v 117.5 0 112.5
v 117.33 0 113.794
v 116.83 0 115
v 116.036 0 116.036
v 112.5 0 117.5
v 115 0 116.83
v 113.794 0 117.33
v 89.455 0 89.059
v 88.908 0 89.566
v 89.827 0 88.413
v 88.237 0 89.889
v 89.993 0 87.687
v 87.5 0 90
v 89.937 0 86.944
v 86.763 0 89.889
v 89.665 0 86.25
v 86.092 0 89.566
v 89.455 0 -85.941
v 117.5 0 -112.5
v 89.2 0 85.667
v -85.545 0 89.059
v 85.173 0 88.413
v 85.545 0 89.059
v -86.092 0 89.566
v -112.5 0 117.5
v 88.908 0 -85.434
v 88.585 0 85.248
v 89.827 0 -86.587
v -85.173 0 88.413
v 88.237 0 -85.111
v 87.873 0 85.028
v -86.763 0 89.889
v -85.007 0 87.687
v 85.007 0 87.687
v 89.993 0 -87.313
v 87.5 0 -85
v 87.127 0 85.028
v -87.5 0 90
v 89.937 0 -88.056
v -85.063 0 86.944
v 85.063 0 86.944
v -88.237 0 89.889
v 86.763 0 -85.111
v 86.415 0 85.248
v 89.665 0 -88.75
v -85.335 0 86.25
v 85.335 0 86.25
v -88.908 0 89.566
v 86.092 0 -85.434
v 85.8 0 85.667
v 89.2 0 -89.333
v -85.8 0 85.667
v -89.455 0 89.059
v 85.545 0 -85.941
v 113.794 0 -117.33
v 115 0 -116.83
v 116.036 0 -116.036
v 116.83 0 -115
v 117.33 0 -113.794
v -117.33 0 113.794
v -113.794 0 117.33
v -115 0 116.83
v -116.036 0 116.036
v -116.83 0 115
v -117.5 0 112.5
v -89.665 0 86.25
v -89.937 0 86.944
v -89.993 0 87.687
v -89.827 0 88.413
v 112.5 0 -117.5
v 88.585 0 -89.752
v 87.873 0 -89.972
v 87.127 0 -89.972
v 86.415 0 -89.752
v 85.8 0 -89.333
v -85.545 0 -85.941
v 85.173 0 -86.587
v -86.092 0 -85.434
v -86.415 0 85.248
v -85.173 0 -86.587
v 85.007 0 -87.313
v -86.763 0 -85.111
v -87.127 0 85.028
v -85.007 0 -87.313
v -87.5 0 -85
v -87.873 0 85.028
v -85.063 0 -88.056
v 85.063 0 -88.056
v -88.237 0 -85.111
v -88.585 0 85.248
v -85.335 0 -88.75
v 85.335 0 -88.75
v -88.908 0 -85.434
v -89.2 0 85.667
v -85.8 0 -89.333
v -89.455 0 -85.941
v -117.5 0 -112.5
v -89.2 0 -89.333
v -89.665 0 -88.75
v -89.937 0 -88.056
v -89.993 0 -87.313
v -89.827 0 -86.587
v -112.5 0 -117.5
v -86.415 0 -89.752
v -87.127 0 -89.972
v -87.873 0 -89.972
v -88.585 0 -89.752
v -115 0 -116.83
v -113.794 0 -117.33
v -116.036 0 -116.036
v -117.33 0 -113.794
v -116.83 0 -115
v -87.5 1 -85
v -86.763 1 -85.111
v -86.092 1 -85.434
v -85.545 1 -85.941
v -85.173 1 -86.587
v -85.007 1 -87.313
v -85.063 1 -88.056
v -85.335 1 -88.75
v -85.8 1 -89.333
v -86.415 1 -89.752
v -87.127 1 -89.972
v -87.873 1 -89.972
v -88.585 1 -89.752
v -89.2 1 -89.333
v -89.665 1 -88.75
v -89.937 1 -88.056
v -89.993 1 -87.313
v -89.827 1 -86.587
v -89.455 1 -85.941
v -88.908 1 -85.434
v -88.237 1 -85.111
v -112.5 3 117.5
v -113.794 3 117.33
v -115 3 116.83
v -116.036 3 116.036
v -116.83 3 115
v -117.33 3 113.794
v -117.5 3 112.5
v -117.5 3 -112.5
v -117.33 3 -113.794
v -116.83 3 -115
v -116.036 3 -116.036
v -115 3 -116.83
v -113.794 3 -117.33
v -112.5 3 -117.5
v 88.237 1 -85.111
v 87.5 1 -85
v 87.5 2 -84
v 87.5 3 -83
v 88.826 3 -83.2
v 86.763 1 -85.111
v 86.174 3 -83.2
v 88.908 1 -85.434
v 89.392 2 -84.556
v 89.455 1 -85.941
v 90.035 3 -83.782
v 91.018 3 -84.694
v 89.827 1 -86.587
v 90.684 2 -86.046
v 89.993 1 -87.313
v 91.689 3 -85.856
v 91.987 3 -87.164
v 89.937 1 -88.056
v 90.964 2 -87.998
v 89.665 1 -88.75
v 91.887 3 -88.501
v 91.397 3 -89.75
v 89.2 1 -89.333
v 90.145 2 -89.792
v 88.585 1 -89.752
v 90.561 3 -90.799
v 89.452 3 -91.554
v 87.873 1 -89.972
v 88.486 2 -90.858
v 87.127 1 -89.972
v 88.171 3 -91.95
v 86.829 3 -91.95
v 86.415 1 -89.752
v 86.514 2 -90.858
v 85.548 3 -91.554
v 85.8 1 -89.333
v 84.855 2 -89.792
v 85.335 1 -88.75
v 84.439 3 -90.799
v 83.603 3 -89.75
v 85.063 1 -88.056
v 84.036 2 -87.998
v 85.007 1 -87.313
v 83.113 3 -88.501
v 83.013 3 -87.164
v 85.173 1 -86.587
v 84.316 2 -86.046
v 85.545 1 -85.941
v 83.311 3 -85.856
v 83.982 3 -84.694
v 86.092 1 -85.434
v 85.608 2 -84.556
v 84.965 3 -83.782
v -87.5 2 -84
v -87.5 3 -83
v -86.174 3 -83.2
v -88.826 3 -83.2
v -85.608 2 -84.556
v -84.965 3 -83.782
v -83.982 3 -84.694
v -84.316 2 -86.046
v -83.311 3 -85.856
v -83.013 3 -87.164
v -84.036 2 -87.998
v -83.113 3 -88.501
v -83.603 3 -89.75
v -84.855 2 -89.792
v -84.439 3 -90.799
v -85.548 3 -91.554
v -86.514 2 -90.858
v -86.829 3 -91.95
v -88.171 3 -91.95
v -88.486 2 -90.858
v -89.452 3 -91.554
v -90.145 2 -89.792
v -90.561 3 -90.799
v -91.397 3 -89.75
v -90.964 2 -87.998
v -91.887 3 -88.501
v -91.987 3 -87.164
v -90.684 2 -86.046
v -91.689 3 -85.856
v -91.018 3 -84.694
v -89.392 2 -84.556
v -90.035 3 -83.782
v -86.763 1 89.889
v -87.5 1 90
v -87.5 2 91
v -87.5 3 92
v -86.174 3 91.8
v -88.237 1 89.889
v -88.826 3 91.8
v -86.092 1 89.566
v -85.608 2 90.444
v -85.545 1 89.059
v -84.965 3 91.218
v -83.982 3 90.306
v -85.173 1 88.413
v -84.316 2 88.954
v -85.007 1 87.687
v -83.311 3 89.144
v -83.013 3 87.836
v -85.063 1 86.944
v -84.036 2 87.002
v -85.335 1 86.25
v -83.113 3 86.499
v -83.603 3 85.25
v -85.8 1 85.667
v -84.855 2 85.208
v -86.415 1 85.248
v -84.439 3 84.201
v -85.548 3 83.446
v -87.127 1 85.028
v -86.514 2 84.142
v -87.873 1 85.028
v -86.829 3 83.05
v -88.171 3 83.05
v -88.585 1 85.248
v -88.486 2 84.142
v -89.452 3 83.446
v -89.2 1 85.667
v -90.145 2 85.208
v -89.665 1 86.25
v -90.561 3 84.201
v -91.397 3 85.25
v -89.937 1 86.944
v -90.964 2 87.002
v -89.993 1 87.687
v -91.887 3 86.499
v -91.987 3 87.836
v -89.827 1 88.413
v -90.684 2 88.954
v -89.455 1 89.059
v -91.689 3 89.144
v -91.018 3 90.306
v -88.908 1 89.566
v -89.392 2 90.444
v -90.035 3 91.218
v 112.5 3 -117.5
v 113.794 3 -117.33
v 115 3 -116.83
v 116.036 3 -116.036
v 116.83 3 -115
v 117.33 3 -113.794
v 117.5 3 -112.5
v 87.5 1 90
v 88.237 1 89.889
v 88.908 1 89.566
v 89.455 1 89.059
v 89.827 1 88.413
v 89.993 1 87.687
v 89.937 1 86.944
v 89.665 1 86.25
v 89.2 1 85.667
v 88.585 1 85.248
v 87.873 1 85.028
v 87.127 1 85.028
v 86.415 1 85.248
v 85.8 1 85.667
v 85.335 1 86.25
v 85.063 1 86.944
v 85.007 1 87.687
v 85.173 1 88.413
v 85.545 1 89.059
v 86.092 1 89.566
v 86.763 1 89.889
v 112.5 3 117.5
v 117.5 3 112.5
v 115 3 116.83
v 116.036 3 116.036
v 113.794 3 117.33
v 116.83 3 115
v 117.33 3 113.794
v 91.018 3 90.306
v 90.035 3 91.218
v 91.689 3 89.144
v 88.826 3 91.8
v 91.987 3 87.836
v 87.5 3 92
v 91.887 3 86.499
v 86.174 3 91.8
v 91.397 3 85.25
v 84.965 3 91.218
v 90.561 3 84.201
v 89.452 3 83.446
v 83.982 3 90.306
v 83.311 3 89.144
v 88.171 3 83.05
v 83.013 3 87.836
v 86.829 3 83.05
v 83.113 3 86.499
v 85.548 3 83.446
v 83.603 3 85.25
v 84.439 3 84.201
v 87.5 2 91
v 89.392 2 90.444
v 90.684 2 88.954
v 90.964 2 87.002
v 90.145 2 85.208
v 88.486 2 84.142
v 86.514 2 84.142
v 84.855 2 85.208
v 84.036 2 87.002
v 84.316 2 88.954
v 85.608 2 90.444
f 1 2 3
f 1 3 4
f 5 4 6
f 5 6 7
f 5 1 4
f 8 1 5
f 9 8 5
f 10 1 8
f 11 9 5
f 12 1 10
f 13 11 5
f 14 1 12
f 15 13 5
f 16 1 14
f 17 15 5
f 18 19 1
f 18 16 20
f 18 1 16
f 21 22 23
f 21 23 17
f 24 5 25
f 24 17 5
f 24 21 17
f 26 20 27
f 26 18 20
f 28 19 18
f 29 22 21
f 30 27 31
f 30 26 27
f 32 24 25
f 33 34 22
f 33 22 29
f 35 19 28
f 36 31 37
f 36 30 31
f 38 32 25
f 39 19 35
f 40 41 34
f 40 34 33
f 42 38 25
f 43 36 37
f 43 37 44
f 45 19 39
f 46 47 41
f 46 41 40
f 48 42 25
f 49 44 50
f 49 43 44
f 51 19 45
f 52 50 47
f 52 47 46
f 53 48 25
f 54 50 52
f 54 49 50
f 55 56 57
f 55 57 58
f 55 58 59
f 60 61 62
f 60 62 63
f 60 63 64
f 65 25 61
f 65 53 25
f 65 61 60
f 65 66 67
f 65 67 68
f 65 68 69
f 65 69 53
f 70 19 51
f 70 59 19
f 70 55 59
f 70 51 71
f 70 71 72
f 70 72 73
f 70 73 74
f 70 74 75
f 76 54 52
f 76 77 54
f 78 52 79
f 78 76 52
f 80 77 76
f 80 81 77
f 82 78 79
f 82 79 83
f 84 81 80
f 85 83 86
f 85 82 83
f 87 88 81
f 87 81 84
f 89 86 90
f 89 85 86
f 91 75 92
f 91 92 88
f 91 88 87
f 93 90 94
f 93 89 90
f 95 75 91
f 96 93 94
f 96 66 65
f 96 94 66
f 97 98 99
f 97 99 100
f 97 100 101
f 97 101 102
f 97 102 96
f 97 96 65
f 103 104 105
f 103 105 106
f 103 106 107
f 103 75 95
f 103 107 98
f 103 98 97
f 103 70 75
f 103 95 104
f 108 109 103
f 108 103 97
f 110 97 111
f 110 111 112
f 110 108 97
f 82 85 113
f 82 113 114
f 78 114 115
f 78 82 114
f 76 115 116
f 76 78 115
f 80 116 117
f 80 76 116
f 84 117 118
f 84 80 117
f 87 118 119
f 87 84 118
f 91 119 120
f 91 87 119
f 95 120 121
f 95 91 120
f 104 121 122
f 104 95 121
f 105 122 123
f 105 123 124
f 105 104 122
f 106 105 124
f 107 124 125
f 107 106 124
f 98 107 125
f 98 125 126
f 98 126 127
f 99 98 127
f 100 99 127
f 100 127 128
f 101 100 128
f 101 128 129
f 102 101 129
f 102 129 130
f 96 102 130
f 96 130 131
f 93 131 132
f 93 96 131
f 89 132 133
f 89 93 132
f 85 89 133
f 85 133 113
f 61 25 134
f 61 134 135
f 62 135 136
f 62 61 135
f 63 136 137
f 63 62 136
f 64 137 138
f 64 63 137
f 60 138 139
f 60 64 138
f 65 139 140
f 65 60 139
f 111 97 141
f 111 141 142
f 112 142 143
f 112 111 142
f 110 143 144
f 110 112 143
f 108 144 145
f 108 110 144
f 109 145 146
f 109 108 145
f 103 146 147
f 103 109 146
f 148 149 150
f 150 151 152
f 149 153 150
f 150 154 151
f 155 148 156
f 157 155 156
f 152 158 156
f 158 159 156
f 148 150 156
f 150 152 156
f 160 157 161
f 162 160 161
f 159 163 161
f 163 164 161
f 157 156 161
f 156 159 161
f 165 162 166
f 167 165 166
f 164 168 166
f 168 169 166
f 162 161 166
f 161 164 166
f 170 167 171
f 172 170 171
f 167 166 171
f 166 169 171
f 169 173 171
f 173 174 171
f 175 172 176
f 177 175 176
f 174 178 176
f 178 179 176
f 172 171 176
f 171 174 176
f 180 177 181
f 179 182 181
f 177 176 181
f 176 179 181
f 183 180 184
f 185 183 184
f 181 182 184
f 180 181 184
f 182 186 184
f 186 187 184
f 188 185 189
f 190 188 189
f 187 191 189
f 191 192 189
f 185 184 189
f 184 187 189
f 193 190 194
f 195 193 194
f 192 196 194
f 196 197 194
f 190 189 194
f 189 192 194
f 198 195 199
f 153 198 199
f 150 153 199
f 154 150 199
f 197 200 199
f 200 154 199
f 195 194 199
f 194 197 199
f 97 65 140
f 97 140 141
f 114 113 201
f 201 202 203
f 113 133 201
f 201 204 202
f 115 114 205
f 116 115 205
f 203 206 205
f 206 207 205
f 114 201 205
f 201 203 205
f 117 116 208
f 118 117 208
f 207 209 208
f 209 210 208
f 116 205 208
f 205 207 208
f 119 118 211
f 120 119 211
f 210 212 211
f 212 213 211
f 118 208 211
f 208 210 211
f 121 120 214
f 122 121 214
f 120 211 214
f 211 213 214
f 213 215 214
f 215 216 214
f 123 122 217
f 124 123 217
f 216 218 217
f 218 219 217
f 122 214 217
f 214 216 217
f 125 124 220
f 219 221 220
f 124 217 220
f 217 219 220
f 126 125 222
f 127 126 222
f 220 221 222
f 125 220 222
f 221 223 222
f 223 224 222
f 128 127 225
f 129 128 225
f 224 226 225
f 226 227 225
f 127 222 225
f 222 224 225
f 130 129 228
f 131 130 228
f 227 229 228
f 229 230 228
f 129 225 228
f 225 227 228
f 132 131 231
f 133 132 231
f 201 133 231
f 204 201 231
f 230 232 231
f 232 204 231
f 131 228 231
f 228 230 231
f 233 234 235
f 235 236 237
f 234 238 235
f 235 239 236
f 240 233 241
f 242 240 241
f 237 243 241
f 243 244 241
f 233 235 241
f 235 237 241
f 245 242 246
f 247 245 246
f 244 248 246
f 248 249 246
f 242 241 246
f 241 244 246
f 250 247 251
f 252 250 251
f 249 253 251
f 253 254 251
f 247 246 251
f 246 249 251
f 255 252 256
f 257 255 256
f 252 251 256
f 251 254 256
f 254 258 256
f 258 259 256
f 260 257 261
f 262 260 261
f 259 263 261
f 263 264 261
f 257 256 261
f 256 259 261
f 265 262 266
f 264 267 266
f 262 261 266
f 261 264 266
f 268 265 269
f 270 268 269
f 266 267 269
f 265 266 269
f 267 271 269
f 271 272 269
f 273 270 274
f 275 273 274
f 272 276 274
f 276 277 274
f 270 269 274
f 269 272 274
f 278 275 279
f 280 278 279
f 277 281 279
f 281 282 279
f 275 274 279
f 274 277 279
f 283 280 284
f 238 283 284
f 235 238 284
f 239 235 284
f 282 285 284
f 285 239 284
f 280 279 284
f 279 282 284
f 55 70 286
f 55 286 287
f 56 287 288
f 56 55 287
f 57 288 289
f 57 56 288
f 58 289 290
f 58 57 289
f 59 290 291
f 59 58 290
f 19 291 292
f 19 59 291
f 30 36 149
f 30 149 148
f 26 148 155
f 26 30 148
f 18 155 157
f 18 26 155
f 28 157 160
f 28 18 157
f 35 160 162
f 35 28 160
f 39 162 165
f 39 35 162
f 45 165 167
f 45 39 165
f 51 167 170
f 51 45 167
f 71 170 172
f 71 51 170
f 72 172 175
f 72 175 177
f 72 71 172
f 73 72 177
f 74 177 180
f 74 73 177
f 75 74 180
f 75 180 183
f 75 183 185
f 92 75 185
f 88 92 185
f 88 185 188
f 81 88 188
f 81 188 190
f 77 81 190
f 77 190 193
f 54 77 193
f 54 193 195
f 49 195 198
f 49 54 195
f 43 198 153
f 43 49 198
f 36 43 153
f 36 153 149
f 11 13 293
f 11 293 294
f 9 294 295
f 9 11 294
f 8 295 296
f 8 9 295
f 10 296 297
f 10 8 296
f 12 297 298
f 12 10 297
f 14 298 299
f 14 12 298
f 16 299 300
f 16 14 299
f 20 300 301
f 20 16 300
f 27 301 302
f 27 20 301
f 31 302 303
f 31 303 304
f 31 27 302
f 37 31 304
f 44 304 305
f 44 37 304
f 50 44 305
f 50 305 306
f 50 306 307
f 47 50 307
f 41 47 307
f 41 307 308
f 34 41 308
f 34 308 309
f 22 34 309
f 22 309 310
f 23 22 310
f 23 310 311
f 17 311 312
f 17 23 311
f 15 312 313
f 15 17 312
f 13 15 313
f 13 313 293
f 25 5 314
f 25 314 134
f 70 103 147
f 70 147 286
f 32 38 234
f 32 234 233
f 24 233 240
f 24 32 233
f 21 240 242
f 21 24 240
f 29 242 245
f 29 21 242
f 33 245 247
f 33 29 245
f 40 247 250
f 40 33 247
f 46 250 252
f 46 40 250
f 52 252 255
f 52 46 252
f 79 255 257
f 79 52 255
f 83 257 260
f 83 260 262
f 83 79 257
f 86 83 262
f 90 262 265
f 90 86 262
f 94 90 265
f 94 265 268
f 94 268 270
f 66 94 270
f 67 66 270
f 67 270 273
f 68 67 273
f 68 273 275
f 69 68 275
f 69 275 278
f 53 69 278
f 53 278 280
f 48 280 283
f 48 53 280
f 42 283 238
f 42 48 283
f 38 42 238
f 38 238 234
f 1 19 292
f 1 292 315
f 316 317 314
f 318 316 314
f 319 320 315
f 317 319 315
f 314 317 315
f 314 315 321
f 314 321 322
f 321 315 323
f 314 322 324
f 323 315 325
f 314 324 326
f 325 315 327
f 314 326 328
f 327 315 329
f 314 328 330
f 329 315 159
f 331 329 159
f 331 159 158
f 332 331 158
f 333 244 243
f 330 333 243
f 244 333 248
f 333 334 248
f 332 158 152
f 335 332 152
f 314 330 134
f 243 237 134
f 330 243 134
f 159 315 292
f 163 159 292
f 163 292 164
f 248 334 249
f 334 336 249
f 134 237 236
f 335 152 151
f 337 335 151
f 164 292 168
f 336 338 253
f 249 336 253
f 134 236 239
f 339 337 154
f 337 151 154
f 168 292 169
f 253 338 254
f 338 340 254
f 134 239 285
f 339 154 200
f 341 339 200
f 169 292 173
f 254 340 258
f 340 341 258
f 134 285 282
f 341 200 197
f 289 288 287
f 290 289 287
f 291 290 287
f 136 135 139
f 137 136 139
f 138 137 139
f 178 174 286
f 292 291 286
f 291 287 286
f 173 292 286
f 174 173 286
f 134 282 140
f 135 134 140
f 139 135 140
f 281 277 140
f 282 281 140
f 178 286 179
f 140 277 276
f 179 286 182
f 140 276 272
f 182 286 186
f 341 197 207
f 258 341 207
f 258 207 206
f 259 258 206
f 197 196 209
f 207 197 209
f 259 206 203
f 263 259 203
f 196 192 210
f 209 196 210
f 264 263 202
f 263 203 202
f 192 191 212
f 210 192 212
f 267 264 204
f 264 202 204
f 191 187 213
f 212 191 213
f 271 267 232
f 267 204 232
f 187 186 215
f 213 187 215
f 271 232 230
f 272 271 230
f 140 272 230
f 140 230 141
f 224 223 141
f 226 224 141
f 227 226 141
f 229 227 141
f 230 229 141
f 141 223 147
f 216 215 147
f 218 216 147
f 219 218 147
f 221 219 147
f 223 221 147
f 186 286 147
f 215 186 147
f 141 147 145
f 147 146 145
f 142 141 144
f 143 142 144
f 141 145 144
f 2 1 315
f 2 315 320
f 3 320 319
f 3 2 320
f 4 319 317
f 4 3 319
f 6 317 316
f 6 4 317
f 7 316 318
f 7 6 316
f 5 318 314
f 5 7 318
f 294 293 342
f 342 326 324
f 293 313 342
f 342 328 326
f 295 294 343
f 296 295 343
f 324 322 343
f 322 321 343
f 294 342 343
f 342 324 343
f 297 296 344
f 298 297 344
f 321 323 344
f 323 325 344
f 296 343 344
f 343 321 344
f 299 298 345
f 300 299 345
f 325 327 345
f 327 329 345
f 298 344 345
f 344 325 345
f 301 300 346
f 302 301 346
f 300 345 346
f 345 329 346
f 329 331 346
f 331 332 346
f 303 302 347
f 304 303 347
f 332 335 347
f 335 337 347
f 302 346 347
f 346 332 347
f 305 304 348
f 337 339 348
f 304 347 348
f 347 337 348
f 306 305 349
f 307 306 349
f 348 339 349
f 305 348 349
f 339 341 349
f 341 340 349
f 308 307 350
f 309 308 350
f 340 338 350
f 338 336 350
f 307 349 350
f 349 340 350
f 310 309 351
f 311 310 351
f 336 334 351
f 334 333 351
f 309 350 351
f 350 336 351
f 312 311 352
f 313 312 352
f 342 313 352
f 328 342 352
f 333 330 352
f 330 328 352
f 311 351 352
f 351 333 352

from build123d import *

# Parameters (mm, degrees)
ESQUISSE1_R        = 2.5
BOSS_EXTRU_1_DEPTH = 3
CHANFREIN1_SIZE    = 2


with BuildPart() as part:
    # Esquisse1 → Boss.-Extru.1 (new body)
    with BuildSketch(Plane(origin=(0, 0, 0), x_dir=(1, 0, 0), z_dir=(0, 1, 0))):
        with BuildLine():
            Line((112.5, -117.5), (-112.5, -117.5))
            ThreePointArc((-112.5, -117.5), (-116.035533906, -116.035533906), (-117.5, -112.5))
            Line((-117.5, -112.5), (-117.5, 112.5))
            ThreePointArc((-117.5, 112.5), (-116.035533906, 116.035533906), (-112.5, 117.5))
            Line((-112.5, 117.5), (112.5, 117.5))
            ThreePointArc((112.5, 117.5), (116.035533906, 116.035533906), (117.5, 112.5))
            Line((117.5, 112.5), (117.5, -112.5))
            ThreePointArc((117.5, -112.5), (116.035533906, -116.035533906), (112.5, -117.5))
        make_face()
        with Locations(Location((-87.5, 87.5, 0), (0, 0, 270))):
            Circle(ESQUISSE1_R, mode=Mode.SUBTRACT)
        with Locations(Location((-87.5, -87.5, 0), (0, 0, 270))):
            Circle(ESQUISSE1_R, mode=Mode.SUBTRACT)
        with Locations(Location((87.5, -87.5, 0), (0, 0, 270))):
            Circle(ESQUISSE1_R, mode=Mode.SUBTRACT)
        with Locations(Location((87.5, 87.5, 0), (0, 0, 270))):
            Circle(ESQUISSE1_R, mode=Mode.SUBTRACT)
    extrude(amount=BOSS_EXTRU_1_DEPTH)

    # Chanfrein1
    chanfrein1_edges = [part.edges().sort_by_distance(p)[0] for p in [
        (-87.5, 3, -90),
        (-87.5, 3, 85),
        (87.5, 3, 85),
        (87.5, 3, -90),
    ]]
    chamfer(chanfrein1_edges, length=CHANFREIN1_SIZE)


solid = part.part
